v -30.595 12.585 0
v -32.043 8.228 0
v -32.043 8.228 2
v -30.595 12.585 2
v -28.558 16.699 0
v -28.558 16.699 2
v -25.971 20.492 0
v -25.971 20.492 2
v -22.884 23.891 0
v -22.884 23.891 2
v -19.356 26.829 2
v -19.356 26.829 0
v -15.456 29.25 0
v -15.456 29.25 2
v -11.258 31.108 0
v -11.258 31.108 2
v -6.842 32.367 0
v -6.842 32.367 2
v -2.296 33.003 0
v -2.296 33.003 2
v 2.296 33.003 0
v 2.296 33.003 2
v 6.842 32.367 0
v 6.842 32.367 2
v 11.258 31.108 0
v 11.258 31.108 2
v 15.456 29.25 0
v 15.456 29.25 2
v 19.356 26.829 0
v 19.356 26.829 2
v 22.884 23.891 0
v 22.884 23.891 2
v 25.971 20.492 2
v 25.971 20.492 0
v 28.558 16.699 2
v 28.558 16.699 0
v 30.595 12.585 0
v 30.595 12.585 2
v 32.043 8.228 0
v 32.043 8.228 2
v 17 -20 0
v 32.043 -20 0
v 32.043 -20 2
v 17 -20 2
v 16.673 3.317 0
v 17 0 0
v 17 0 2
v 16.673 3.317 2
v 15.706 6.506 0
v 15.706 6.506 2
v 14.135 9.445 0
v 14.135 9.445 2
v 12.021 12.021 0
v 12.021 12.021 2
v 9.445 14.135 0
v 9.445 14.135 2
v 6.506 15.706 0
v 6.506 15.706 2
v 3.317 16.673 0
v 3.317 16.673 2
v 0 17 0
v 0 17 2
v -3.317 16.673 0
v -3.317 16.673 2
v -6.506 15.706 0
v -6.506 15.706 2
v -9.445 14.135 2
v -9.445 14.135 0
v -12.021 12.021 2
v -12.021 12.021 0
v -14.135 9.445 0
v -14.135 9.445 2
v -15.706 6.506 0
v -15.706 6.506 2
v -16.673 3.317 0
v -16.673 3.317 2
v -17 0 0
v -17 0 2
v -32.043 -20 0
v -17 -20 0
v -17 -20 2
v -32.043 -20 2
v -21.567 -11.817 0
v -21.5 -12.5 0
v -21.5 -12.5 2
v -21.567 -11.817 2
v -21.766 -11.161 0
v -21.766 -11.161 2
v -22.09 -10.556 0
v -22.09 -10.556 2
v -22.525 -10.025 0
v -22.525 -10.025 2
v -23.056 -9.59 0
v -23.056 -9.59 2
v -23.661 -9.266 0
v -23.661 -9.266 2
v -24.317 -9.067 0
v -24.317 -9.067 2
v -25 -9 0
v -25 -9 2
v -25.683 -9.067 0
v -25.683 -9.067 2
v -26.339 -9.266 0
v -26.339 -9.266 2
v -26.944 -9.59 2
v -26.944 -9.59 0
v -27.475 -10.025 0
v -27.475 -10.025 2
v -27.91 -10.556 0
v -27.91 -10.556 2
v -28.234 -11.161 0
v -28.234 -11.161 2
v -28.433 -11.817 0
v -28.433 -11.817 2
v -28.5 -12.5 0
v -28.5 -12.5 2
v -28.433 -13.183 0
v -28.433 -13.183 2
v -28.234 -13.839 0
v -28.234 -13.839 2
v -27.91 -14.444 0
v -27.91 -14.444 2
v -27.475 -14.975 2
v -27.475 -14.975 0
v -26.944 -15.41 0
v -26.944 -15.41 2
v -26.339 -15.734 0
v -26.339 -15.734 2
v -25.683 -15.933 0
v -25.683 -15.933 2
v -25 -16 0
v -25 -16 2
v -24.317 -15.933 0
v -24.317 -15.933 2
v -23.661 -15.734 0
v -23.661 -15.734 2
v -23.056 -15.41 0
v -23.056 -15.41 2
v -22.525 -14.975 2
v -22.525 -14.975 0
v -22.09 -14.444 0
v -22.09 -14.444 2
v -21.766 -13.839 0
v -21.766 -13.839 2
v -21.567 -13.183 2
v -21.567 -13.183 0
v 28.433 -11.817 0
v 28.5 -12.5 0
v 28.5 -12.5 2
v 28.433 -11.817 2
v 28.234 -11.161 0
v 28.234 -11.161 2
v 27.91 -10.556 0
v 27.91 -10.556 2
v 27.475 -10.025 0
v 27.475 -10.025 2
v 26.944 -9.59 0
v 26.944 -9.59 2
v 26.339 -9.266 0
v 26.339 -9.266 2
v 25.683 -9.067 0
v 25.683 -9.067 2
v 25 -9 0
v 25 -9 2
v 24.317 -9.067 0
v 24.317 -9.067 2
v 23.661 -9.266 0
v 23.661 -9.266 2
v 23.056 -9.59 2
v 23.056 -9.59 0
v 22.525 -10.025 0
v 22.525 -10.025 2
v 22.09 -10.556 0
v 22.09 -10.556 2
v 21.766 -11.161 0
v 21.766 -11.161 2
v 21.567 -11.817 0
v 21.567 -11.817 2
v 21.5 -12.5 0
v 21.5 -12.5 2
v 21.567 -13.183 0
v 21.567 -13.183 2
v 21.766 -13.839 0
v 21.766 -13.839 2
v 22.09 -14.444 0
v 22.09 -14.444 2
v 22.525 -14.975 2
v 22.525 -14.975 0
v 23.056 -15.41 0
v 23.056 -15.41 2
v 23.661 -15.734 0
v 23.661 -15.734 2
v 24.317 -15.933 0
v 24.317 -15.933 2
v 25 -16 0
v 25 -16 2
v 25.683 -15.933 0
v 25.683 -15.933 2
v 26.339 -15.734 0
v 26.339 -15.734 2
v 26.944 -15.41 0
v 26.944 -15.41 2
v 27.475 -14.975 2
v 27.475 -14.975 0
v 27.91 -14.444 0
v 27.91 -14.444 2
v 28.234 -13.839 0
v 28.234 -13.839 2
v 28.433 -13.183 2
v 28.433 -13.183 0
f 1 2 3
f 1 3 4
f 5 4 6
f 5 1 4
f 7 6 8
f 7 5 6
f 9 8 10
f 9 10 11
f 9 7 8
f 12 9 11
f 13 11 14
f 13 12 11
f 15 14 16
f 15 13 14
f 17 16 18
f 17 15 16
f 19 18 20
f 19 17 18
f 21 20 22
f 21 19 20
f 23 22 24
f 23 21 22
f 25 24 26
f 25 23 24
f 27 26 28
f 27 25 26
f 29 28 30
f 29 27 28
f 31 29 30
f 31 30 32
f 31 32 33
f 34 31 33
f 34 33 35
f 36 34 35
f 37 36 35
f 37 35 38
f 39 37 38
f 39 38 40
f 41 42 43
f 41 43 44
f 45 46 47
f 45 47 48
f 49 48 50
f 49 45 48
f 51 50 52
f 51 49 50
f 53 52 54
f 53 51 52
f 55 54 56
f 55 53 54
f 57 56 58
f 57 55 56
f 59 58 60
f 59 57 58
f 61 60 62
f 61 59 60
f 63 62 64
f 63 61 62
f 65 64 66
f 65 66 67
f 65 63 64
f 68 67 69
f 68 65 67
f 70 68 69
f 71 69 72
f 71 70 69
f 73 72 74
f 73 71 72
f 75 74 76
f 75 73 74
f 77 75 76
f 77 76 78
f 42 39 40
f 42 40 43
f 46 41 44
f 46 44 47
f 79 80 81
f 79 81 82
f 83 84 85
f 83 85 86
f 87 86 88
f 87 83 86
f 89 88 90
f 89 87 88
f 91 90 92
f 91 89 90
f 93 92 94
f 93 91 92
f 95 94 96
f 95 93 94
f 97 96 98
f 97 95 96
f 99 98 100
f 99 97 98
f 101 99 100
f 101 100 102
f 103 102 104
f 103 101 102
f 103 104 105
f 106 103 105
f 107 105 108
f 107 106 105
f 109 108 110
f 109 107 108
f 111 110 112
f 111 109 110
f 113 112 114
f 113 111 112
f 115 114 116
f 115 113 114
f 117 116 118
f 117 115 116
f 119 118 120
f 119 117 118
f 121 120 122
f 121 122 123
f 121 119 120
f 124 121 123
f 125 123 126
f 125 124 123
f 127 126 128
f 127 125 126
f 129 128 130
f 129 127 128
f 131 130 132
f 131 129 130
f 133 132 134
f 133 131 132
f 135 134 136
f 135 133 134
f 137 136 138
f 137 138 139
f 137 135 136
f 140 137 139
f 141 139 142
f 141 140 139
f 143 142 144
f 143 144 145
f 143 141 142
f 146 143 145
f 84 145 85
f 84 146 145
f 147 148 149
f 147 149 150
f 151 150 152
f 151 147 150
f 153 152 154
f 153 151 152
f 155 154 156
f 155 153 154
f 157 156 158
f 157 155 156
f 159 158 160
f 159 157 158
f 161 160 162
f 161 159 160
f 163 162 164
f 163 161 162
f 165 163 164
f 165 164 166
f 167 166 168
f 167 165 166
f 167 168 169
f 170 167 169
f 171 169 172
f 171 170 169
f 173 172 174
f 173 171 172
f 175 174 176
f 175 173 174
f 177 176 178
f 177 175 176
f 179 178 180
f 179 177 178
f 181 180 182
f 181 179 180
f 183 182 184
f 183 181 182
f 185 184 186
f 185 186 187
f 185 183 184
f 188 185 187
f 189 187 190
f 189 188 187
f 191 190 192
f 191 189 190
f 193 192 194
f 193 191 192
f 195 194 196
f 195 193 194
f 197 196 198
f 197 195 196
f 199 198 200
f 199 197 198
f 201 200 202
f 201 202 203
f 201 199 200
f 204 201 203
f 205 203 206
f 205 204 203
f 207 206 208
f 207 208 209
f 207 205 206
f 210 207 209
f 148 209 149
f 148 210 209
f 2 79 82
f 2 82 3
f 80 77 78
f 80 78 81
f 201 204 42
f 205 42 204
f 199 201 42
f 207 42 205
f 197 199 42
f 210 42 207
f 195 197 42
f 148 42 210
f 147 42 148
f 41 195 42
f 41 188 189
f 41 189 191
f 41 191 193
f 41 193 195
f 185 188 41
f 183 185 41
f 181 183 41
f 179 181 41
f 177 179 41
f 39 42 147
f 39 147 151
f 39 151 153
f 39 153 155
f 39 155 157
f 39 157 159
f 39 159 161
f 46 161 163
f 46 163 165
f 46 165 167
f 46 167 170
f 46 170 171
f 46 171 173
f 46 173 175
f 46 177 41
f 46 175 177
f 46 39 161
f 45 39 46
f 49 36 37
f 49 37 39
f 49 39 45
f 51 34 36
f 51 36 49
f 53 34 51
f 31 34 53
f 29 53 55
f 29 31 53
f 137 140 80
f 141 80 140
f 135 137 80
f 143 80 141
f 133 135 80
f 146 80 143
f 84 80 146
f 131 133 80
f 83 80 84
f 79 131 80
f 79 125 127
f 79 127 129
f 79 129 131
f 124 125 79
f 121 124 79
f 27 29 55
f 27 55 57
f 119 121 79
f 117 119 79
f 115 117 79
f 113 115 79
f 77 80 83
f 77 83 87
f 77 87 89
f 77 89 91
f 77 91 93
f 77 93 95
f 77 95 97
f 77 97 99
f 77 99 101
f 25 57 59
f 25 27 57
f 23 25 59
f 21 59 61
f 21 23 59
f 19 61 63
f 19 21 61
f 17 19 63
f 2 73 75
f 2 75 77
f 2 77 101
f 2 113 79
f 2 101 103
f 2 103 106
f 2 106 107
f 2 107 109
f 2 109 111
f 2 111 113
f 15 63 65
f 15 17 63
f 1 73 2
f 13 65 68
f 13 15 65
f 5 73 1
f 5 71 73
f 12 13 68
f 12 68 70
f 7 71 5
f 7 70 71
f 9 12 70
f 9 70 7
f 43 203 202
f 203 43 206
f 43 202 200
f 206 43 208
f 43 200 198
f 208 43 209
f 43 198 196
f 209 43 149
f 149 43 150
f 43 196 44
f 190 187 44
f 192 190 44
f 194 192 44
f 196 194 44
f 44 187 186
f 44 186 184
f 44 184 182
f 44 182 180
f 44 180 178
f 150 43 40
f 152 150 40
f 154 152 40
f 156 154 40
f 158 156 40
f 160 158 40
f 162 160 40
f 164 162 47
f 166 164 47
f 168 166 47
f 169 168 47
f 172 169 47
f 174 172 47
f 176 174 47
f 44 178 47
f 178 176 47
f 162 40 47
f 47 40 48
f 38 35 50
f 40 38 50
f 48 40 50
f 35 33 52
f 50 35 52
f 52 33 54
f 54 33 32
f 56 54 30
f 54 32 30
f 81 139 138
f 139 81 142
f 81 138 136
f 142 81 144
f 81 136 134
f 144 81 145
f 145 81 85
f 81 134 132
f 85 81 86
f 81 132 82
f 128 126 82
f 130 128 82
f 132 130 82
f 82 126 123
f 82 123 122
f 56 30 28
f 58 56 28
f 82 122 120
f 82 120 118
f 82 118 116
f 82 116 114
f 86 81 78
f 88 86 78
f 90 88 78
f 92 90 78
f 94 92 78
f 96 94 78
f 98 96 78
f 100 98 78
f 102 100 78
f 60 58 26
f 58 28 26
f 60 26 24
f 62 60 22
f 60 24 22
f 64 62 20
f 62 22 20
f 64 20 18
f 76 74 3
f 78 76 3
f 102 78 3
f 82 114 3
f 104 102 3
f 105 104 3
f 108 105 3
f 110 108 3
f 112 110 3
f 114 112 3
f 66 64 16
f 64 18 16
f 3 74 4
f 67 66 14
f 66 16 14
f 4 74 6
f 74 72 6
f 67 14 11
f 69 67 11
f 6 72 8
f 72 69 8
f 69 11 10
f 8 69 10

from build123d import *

# Parameters (mm, degrees)
SKETCH1_R           = 3.5
BOSS_EXTRUDE1_DEPTH = 2


with BuildPart() as part:
    # Sketch1 → Boss-Extrude1 (new body)
    with BuildSketch(Plane.XY):
        with BuildLine():
            Line((-17.5, -20), (-32.04293994, -20))
            Line((-32.04293994, -20), (-32.04293994, 8.228064973))
            ThreePointArc((-32.04293994, 8.228064973), (0, 33.082488619), (32.04293994, 8.228064973))
            Line((32.04293994, 8.228064973), (32.04293994, -20))
            Line((32.04293994, -20), (17.5, -20))
            Line((17.5, -20), (17, -20))
            Line((17, -20), (17, 0))
            ThreePointArc((17, 0), (0, 17), (-17, 0))
            Line((-17, 0), (-17, -20))
            Line((-17, -20), (-17.5, -20))
        make_face()
        with Locations((-25, -12.5)):
            Circle(SKETCH1_R, mode=Mode.SUBTRACT)
        with Locations((25, -12.5)):
            Circle(SKETCH1_R, mode=Mode.SUBTRACT)
    extrude(amount=BOSS_EXTRUDE1_DEPTH)


solid = part.part
